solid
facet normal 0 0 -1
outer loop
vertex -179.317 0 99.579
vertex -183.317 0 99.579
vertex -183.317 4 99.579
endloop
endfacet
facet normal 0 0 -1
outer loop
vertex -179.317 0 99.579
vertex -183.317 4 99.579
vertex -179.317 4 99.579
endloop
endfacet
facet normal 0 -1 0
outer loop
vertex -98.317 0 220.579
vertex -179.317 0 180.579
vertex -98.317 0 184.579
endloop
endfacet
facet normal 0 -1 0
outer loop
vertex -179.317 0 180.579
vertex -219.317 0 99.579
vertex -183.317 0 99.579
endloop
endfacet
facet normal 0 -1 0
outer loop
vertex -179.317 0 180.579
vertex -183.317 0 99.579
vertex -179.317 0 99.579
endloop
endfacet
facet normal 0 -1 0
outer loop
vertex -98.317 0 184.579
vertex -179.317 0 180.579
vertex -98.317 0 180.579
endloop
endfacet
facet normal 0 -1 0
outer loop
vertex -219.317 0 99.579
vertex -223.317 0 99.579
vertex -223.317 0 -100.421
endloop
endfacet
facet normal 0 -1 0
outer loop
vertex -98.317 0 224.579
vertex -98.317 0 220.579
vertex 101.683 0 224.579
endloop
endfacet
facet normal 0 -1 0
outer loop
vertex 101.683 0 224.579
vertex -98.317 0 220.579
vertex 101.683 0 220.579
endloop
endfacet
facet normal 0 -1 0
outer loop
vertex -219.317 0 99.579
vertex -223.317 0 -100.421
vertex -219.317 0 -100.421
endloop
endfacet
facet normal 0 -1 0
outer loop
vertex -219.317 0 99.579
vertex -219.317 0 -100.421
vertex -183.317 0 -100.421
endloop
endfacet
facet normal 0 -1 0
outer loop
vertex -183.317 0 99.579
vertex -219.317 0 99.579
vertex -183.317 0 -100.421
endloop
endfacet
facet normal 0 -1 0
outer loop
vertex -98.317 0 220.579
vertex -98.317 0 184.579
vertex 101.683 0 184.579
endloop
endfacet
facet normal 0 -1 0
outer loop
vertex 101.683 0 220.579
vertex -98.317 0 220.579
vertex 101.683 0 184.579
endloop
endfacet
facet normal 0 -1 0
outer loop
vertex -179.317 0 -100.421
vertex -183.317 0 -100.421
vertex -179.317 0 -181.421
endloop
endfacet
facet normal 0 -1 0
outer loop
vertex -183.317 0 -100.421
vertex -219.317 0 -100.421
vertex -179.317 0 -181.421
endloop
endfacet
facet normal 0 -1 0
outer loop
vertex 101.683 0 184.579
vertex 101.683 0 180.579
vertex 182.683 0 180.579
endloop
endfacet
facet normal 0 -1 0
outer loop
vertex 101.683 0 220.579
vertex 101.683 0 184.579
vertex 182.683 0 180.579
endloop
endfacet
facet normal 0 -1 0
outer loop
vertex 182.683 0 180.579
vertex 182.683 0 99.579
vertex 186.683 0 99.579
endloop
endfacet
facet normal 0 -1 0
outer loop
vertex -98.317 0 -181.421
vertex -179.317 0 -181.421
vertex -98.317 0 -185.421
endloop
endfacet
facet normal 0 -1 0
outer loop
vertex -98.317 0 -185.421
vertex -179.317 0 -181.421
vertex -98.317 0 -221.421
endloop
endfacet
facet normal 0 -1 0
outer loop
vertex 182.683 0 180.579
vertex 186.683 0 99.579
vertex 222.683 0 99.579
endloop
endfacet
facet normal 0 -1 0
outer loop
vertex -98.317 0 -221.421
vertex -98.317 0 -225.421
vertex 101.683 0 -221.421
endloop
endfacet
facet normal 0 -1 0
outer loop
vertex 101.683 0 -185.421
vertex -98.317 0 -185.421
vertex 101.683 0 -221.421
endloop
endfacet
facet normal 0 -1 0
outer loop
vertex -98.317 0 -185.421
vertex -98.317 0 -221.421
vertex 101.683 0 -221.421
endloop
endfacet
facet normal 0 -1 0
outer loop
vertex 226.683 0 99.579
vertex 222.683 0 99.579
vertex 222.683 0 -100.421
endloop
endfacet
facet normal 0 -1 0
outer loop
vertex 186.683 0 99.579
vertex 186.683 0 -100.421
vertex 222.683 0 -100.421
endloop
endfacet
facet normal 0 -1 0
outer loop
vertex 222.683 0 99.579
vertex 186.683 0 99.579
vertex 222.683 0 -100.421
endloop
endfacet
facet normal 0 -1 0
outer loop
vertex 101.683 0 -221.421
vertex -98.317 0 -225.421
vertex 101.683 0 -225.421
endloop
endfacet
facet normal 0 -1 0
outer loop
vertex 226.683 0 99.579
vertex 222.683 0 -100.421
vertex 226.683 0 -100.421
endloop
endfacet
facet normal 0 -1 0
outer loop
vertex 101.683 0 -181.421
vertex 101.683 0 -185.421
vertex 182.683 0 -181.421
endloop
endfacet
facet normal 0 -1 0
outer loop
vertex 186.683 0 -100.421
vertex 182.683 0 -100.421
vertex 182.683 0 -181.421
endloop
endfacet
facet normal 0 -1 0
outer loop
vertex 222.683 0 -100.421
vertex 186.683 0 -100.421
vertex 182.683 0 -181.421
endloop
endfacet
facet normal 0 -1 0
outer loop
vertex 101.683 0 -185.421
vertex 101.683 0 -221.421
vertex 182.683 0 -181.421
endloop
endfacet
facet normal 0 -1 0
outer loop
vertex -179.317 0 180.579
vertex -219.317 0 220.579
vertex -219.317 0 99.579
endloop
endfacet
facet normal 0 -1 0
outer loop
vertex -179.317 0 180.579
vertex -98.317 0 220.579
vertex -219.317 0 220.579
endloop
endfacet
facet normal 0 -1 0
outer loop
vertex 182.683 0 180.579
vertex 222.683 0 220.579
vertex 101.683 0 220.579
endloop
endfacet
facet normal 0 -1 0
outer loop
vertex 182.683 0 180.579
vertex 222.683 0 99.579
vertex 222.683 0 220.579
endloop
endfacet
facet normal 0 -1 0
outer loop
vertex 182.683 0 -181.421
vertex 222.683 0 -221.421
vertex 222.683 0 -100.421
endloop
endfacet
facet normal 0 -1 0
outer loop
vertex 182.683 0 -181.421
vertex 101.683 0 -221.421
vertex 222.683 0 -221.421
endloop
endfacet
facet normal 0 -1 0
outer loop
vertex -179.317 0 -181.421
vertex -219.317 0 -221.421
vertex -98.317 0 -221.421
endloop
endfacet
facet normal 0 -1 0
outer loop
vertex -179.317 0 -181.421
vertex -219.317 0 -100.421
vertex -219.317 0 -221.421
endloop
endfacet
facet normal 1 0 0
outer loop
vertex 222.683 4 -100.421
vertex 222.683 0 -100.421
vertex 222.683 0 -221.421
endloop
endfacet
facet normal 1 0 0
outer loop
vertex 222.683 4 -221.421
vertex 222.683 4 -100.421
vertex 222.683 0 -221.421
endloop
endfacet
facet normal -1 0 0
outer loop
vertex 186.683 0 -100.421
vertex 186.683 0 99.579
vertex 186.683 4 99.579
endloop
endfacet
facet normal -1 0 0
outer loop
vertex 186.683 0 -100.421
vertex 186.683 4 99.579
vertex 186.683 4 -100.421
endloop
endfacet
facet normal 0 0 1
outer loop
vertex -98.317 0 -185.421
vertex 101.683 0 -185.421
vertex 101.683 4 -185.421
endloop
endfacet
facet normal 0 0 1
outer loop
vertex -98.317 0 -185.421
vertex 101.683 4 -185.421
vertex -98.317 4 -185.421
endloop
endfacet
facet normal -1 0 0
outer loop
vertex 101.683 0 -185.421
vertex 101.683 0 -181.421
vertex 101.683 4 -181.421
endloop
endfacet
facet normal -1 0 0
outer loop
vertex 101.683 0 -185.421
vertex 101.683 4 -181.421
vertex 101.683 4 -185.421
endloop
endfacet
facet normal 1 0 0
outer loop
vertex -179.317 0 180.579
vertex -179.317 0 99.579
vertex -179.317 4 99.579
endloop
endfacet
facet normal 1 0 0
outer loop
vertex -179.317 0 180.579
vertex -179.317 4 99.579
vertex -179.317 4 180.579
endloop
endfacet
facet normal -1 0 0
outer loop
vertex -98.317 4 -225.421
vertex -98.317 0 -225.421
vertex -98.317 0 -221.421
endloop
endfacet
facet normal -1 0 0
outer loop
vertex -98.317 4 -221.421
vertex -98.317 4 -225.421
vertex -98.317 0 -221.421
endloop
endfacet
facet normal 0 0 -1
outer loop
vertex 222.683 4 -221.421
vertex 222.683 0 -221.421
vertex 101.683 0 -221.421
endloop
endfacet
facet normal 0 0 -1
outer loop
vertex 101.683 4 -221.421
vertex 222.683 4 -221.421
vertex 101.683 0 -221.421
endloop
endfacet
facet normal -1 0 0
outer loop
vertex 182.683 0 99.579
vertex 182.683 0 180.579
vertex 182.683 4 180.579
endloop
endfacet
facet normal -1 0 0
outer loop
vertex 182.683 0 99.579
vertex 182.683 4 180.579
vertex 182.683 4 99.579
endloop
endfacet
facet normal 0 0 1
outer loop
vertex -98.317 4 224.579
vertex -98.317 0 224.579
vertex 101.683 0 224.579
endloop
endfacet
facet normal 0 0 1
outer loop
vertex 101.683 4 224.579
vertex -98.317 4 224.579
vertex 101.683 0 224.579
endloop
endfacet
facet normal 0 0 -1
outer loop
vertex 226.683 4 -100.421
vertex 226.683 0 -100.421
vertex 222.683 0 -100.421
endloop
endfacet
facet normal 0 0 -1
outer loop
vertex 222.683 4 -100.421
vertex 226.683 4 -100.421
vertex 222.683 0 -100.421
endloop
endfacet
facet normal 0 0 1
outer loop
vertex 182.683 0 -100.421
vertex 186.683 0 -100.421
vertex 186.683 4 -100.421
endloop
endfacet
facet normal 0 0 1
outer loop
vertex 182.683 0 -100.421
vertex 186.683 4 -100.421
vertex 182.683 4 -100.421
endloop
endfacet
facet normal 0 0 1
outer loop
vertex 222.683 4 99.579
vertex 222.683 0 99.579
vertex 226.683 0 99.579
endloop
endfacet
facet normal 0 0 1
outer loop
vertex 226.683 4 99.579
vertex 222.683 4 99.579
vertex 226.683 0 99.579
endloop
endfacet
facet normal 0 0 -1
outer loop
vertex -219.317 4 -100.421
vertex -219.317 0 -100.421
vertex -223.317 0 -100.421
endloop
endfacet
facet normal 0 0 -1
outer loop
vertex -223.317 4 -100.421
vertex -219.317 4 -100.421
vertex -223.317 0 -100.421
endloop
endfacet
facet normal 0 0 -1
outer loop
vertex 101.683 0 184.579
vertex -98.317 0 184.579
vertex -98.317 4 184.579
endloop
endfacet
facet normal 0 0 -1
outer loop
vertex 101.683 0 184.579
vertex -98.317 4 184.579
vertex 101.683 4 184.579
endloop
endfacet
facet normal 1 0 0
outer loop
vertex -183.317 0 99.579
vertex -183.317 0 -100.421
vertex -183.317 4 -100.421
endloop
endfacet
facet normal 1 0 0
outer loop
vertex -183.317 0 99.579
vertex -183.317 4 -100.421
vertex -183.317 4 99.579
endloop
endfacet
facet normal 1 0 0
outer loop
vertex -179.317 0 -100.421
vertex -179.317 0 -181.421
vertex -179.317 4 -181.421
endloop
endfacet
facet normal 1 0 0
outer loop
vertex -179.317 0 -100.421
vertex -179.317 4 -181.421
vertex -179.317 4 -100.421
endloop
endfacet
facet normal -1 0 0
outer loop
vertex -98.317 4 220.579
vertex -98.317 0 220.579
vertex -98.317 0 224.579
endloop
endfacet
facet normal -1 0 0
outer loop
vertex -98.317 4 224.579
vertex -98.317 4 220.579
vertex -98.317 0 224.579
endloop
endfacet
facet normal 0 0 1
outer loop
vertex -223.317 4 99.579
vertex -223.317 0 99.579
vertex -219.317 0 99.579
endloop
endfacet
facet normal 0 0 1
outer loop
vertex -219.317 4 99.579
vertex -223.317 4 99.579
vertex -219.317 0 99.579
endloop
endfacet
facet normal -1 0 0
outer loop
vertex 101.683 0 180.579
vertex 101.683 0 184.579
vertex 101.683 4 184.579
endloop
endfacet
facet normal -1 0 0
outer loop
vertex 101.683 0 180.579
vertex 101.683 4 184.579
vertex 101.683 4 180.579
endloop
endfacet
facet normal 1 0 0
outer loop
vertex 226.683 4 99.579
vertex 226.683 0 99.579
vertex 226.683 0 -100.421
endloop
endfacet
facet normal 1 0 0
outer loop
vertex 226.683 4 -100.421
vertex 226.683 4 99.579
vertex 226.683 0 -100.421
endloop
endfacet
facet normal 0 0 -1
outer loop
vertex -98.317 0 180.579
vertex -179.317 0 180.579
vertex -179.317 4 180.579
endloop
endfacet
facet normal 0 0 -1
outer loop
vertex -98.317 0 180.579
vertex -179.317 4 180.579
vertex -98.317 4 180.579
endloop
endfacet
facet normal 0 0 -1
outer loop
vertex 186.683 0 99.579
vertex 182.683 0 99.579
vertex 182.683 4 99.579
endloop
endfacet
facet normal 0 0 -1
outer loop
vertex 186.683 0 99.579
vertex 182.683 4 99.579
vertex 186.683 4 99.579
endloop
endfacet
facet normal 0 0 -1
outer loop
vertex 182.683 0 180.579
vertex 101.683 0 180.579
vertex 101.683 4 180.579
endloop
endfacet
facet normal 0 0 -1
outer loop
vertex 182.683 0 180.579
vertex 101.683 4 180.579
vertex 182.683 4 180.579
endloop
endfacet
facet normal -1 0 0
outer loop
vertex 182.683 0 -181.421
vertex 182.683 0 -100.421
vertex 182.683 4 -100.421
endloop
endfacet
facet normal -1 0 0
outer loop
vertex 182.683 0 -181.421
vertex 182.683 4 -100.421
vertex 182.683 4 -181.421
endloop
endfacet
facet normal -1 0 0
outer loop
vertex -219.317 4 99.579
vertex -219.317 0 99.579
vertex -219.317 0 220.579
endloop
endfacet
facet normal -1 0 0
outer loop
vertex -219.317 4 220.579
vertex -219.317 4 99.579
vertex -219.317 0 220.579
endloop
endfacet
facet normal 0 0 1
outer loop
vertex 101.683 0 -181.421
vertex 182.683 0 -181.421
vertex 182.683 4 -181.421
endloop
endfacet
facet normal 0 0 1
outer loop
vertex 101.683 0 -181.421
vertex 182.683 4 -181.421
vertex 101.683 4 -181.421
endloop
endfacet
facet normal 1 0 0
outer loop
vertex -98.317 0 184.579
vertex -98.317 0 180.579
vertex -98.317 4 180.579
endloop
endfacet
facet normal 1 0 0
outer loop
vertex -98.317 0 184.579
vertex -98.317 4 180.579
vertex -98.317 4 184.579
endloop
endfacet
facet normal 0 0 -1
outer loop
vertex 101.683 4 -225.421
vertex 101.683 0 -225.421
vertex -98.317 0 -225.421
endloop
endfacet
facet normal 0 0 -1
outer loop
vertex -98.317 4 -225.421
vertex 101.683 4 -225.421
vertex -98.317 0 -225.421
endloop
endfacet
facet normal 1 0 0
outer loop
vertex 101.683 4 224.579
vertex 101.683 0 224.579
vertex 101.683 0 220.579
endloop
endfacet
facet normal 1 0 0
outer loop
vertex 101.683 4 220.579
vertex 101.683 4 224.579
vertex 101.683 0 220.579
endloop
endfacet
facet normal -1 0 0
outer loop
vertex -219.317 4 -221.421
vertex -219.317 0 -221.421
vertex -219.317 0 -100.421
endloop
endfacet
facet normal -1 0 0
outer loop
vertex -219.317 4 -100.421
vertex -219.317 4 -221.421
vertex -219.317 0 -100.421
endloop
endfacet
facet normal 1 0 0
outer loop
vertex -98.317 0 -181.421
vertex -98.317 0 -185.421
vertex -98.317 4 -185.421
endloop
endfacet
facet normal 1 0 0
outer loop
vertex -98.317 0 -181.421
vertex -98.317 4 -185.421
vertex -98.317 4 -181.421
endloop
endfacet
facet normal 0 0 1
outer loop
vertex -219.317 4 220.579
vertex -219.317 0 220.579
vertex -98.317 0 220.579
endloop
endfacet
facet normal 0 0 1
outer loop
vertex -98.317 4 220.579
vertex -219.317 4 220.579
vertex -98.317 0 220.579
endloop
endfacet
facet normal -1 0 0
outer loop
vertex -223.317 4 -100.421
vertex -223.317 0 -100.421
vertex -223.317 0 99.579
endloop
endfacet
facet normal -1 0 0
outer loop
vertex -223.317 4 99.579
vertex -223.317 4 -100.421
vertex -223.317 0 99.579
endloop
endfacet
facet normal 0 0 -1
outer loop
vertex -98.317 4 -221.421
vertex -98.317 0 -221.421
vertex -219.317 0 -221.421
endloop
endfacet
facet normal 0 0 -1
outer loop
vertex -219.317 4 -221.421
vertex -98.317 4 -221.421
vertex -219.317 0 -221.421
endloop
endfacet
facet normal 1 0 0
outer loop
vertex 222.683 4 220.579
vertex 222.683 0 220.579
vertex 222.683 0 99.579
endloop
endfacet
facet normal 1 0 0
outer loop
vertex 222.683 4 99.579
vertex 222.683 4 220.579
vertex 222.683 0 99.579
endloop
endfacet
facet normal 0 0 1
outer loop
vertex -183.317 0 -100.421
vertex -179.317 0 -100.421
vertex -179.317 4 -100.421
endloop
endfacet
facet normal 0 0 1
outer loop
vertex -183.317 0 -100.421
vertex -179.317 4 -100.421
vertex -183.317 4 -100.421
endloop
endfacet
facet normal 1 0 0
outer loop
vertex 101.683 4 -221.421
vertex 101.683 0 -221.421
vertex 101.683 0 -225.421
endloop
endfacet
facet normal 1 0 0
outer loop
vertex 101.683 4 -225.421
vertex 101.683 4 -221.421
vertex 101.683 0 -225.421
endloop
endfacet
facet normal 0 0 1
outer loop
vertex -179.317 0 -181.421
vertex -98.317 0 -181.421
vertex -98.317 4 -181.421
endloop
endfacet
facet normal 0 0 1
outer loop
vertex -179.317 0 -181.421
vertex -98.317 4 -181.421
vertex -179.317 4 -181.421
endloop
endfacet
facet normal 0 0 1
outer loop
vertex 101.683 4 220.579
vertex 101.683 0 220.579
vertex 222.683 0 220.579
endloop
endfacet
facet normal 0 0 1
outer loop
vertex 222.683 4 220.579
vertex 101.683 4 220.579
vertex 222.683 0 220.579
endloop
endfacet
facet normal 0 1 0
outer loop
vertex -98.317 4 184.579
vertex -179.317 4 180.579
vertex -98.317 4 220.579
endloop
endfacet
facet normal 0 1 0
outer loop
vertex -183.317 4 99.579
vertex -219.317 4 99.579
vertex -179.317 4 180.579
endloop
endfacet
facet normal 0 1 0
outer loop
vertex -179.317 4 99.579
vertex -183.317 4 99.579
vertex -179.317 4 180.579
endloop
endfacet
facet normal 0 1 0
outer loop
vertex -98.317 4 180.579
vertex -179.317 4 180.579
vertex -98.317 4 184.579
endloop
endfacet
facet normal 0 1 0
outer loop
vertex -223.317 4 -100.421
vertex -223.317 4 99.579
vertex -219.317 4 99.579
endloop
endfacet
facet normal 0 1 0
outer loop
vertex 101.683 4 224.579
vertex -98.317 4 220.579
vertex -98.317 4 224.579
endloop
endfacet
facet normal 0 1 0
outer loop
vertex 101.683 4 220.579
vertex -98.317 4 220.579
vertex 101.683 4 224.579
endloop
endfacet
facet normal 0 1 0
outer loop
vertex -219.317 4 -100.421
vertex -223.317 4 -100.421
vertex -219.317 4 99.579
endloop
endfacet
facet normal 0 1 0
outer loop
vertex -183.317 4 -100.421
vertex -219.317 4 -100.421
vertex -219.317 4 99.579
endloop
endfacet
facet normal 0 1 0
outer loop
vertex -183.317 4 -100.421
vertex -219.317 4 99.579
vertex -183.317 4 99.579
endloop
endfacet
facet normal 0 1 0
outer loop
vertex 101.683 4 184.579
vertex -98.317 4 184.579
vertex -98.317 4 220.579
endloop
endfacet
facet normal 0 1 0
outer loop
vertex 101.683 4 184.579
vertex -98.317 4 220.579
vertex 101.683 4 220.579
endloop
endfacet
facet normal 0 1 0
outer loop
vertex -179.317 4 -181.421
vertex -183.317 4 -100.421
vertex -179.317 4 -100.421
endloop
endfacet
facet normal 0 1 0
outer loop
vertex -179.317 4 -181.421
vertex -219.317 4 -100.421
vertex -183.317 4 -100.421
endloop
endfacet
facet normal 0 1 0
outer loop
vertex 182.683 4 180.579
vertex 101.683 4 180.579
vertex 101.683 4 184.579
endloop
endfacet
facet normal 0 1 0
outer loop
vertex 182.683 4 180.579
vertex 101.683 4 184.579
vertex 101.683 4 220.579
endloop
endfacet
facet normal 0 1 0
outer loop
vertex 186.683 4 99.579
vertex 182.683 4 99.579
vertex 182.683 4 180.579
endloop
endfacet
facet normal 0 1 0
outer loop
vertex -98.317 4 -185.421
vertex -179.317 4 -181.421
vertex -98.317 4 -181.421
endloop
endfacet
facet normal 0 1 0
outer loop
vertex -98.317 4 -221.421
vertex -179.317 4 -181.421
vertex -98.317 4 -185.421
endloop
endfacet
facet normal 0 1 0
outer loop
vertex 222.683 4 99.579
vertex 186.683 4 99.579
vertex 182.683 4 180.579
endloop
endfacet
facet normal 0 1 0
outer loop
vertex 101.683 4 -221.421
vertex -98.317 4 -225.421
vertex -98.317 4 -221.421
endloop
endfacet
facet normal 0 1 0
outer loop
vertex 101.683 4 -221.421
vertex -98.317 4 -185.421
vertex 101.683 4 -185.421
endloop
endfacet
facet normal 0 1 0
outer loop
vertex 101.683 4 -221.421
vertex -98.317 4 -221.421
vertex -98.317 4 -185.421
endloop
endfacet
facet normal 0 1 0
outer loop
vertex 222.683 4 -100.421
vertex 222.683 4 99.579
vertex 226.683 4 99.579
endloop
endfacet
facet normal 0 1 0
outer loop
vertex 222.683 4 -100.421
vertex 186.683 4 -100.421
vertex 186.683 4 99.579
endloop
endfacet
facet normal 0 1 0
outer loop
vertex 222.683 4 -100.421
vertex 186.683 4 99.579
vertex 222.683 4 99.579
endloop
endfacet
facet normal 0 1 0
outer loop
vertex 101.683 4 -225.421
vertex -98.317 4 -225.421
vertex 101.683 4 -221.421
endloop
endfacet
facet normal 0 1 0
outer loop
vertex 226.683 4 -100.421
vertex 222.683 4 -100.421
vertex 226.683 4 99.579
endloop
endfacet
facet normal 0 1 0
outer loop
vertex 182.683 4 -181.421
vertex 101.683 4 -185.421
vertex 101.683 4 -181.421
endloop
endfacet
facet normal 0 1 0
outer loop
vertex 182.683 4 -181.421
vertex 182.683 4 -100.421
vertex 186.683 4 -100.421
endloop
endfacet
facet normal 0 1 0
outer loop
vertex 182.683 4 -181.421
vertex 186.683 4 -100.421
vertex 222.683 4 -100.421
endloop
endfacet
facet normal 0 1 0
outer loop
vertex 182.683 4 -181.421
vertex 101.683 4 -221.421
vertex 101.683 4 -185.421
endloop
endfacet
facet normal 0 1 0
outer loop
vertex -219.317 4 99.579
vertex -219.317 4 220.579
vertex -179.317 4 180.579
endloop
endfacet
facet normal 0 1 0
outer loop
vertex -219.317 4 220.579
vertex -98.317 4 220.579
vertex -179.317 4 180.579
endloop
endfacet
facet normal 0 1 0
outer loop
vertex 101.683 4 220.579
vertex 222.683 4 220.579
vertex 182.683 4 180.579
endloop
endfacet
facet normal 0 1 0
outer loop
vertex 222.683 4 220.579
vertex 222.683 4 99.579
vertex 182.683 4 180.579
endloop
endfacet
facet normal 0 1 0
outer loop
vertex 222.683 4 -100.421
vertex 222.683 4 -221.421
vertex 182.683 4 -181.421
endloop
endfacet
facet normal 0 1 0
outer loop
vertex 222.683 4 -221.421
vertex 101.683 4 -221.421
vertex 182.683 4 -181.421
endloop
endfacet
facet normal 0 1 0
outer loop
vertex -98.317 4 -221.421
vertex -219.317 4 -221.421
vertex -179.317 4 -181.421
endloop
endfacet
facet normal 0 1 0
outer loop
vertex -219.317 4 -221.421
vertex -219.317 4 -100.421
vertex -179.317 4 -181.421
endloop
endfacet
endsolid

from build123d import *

# Parameters (mm, degrees)
BOSS_EXTRUDE1_DEPTH = 4


with BuildPart() as part:
    # Sketch1 → Boss-Extrude1 (new body)
    with BuildSketch(Plane(origin=(0, 0, 0), x_dir=(1, 0, 0), z_dir=(0, 1, 0))):
        Polygon((-219.316556264, 100.420860934), (-223.316556264, 100.420860934), (-223.316556264, -99.579139066), (-219.316556264, -99.579139066), (-219.316556264, -220.579139066), (-98.316556264, -220.579139066), (-98.316556264, -224.579139066), (101.683443736, -224.579139066), (101.683443736, -220.579139066), (222.683443736, -220.579139066), (222.683443736, -99.579139066), (226.683443736, -99.579139066), (226.683443736, 100.420860934), (222.683443736, 100.420860934), (222.683443736, 221.420860934), (101.683443736, 221.420860934), (101.683443736, 225.420860934), (-98.316556264, 225.420860934), (-98.316556264, 221.420860934), (-219.316556264, 221.420860934), align=None)
        Polygon((-179.316556264, -180.579139066), (-98.316556264, -180.579139066), (-98.316556264, -184.579139066), (101.683443736, -184.579139066), (101.683443736, -180.579139066), (182.683443736, -180.579139066), (182.683443736, -99.579139066), (186.683443736, -99.579139066), (186.683443736, 100.420860934), (182.683443736, 100.420860934), (182.683443736, 181.420860934), (101.683443736, 181.420860934), (101.683443736, 185.420860934), (-98.316556264, 185.420860934), (-98.316556264, 181.420860934), (-179.316556264, 181.420860934), (-179.316556264, 100.420860934), (-183.316556264, 100.420860934), (-183.316556264, -99.579139066), (-179.316556264, -99.579139066), align=None, mode=Mode.SUBTRACT)
    extrude(amount=BOSS_EXTRUDE1_DEPTH)


solid = part.part
